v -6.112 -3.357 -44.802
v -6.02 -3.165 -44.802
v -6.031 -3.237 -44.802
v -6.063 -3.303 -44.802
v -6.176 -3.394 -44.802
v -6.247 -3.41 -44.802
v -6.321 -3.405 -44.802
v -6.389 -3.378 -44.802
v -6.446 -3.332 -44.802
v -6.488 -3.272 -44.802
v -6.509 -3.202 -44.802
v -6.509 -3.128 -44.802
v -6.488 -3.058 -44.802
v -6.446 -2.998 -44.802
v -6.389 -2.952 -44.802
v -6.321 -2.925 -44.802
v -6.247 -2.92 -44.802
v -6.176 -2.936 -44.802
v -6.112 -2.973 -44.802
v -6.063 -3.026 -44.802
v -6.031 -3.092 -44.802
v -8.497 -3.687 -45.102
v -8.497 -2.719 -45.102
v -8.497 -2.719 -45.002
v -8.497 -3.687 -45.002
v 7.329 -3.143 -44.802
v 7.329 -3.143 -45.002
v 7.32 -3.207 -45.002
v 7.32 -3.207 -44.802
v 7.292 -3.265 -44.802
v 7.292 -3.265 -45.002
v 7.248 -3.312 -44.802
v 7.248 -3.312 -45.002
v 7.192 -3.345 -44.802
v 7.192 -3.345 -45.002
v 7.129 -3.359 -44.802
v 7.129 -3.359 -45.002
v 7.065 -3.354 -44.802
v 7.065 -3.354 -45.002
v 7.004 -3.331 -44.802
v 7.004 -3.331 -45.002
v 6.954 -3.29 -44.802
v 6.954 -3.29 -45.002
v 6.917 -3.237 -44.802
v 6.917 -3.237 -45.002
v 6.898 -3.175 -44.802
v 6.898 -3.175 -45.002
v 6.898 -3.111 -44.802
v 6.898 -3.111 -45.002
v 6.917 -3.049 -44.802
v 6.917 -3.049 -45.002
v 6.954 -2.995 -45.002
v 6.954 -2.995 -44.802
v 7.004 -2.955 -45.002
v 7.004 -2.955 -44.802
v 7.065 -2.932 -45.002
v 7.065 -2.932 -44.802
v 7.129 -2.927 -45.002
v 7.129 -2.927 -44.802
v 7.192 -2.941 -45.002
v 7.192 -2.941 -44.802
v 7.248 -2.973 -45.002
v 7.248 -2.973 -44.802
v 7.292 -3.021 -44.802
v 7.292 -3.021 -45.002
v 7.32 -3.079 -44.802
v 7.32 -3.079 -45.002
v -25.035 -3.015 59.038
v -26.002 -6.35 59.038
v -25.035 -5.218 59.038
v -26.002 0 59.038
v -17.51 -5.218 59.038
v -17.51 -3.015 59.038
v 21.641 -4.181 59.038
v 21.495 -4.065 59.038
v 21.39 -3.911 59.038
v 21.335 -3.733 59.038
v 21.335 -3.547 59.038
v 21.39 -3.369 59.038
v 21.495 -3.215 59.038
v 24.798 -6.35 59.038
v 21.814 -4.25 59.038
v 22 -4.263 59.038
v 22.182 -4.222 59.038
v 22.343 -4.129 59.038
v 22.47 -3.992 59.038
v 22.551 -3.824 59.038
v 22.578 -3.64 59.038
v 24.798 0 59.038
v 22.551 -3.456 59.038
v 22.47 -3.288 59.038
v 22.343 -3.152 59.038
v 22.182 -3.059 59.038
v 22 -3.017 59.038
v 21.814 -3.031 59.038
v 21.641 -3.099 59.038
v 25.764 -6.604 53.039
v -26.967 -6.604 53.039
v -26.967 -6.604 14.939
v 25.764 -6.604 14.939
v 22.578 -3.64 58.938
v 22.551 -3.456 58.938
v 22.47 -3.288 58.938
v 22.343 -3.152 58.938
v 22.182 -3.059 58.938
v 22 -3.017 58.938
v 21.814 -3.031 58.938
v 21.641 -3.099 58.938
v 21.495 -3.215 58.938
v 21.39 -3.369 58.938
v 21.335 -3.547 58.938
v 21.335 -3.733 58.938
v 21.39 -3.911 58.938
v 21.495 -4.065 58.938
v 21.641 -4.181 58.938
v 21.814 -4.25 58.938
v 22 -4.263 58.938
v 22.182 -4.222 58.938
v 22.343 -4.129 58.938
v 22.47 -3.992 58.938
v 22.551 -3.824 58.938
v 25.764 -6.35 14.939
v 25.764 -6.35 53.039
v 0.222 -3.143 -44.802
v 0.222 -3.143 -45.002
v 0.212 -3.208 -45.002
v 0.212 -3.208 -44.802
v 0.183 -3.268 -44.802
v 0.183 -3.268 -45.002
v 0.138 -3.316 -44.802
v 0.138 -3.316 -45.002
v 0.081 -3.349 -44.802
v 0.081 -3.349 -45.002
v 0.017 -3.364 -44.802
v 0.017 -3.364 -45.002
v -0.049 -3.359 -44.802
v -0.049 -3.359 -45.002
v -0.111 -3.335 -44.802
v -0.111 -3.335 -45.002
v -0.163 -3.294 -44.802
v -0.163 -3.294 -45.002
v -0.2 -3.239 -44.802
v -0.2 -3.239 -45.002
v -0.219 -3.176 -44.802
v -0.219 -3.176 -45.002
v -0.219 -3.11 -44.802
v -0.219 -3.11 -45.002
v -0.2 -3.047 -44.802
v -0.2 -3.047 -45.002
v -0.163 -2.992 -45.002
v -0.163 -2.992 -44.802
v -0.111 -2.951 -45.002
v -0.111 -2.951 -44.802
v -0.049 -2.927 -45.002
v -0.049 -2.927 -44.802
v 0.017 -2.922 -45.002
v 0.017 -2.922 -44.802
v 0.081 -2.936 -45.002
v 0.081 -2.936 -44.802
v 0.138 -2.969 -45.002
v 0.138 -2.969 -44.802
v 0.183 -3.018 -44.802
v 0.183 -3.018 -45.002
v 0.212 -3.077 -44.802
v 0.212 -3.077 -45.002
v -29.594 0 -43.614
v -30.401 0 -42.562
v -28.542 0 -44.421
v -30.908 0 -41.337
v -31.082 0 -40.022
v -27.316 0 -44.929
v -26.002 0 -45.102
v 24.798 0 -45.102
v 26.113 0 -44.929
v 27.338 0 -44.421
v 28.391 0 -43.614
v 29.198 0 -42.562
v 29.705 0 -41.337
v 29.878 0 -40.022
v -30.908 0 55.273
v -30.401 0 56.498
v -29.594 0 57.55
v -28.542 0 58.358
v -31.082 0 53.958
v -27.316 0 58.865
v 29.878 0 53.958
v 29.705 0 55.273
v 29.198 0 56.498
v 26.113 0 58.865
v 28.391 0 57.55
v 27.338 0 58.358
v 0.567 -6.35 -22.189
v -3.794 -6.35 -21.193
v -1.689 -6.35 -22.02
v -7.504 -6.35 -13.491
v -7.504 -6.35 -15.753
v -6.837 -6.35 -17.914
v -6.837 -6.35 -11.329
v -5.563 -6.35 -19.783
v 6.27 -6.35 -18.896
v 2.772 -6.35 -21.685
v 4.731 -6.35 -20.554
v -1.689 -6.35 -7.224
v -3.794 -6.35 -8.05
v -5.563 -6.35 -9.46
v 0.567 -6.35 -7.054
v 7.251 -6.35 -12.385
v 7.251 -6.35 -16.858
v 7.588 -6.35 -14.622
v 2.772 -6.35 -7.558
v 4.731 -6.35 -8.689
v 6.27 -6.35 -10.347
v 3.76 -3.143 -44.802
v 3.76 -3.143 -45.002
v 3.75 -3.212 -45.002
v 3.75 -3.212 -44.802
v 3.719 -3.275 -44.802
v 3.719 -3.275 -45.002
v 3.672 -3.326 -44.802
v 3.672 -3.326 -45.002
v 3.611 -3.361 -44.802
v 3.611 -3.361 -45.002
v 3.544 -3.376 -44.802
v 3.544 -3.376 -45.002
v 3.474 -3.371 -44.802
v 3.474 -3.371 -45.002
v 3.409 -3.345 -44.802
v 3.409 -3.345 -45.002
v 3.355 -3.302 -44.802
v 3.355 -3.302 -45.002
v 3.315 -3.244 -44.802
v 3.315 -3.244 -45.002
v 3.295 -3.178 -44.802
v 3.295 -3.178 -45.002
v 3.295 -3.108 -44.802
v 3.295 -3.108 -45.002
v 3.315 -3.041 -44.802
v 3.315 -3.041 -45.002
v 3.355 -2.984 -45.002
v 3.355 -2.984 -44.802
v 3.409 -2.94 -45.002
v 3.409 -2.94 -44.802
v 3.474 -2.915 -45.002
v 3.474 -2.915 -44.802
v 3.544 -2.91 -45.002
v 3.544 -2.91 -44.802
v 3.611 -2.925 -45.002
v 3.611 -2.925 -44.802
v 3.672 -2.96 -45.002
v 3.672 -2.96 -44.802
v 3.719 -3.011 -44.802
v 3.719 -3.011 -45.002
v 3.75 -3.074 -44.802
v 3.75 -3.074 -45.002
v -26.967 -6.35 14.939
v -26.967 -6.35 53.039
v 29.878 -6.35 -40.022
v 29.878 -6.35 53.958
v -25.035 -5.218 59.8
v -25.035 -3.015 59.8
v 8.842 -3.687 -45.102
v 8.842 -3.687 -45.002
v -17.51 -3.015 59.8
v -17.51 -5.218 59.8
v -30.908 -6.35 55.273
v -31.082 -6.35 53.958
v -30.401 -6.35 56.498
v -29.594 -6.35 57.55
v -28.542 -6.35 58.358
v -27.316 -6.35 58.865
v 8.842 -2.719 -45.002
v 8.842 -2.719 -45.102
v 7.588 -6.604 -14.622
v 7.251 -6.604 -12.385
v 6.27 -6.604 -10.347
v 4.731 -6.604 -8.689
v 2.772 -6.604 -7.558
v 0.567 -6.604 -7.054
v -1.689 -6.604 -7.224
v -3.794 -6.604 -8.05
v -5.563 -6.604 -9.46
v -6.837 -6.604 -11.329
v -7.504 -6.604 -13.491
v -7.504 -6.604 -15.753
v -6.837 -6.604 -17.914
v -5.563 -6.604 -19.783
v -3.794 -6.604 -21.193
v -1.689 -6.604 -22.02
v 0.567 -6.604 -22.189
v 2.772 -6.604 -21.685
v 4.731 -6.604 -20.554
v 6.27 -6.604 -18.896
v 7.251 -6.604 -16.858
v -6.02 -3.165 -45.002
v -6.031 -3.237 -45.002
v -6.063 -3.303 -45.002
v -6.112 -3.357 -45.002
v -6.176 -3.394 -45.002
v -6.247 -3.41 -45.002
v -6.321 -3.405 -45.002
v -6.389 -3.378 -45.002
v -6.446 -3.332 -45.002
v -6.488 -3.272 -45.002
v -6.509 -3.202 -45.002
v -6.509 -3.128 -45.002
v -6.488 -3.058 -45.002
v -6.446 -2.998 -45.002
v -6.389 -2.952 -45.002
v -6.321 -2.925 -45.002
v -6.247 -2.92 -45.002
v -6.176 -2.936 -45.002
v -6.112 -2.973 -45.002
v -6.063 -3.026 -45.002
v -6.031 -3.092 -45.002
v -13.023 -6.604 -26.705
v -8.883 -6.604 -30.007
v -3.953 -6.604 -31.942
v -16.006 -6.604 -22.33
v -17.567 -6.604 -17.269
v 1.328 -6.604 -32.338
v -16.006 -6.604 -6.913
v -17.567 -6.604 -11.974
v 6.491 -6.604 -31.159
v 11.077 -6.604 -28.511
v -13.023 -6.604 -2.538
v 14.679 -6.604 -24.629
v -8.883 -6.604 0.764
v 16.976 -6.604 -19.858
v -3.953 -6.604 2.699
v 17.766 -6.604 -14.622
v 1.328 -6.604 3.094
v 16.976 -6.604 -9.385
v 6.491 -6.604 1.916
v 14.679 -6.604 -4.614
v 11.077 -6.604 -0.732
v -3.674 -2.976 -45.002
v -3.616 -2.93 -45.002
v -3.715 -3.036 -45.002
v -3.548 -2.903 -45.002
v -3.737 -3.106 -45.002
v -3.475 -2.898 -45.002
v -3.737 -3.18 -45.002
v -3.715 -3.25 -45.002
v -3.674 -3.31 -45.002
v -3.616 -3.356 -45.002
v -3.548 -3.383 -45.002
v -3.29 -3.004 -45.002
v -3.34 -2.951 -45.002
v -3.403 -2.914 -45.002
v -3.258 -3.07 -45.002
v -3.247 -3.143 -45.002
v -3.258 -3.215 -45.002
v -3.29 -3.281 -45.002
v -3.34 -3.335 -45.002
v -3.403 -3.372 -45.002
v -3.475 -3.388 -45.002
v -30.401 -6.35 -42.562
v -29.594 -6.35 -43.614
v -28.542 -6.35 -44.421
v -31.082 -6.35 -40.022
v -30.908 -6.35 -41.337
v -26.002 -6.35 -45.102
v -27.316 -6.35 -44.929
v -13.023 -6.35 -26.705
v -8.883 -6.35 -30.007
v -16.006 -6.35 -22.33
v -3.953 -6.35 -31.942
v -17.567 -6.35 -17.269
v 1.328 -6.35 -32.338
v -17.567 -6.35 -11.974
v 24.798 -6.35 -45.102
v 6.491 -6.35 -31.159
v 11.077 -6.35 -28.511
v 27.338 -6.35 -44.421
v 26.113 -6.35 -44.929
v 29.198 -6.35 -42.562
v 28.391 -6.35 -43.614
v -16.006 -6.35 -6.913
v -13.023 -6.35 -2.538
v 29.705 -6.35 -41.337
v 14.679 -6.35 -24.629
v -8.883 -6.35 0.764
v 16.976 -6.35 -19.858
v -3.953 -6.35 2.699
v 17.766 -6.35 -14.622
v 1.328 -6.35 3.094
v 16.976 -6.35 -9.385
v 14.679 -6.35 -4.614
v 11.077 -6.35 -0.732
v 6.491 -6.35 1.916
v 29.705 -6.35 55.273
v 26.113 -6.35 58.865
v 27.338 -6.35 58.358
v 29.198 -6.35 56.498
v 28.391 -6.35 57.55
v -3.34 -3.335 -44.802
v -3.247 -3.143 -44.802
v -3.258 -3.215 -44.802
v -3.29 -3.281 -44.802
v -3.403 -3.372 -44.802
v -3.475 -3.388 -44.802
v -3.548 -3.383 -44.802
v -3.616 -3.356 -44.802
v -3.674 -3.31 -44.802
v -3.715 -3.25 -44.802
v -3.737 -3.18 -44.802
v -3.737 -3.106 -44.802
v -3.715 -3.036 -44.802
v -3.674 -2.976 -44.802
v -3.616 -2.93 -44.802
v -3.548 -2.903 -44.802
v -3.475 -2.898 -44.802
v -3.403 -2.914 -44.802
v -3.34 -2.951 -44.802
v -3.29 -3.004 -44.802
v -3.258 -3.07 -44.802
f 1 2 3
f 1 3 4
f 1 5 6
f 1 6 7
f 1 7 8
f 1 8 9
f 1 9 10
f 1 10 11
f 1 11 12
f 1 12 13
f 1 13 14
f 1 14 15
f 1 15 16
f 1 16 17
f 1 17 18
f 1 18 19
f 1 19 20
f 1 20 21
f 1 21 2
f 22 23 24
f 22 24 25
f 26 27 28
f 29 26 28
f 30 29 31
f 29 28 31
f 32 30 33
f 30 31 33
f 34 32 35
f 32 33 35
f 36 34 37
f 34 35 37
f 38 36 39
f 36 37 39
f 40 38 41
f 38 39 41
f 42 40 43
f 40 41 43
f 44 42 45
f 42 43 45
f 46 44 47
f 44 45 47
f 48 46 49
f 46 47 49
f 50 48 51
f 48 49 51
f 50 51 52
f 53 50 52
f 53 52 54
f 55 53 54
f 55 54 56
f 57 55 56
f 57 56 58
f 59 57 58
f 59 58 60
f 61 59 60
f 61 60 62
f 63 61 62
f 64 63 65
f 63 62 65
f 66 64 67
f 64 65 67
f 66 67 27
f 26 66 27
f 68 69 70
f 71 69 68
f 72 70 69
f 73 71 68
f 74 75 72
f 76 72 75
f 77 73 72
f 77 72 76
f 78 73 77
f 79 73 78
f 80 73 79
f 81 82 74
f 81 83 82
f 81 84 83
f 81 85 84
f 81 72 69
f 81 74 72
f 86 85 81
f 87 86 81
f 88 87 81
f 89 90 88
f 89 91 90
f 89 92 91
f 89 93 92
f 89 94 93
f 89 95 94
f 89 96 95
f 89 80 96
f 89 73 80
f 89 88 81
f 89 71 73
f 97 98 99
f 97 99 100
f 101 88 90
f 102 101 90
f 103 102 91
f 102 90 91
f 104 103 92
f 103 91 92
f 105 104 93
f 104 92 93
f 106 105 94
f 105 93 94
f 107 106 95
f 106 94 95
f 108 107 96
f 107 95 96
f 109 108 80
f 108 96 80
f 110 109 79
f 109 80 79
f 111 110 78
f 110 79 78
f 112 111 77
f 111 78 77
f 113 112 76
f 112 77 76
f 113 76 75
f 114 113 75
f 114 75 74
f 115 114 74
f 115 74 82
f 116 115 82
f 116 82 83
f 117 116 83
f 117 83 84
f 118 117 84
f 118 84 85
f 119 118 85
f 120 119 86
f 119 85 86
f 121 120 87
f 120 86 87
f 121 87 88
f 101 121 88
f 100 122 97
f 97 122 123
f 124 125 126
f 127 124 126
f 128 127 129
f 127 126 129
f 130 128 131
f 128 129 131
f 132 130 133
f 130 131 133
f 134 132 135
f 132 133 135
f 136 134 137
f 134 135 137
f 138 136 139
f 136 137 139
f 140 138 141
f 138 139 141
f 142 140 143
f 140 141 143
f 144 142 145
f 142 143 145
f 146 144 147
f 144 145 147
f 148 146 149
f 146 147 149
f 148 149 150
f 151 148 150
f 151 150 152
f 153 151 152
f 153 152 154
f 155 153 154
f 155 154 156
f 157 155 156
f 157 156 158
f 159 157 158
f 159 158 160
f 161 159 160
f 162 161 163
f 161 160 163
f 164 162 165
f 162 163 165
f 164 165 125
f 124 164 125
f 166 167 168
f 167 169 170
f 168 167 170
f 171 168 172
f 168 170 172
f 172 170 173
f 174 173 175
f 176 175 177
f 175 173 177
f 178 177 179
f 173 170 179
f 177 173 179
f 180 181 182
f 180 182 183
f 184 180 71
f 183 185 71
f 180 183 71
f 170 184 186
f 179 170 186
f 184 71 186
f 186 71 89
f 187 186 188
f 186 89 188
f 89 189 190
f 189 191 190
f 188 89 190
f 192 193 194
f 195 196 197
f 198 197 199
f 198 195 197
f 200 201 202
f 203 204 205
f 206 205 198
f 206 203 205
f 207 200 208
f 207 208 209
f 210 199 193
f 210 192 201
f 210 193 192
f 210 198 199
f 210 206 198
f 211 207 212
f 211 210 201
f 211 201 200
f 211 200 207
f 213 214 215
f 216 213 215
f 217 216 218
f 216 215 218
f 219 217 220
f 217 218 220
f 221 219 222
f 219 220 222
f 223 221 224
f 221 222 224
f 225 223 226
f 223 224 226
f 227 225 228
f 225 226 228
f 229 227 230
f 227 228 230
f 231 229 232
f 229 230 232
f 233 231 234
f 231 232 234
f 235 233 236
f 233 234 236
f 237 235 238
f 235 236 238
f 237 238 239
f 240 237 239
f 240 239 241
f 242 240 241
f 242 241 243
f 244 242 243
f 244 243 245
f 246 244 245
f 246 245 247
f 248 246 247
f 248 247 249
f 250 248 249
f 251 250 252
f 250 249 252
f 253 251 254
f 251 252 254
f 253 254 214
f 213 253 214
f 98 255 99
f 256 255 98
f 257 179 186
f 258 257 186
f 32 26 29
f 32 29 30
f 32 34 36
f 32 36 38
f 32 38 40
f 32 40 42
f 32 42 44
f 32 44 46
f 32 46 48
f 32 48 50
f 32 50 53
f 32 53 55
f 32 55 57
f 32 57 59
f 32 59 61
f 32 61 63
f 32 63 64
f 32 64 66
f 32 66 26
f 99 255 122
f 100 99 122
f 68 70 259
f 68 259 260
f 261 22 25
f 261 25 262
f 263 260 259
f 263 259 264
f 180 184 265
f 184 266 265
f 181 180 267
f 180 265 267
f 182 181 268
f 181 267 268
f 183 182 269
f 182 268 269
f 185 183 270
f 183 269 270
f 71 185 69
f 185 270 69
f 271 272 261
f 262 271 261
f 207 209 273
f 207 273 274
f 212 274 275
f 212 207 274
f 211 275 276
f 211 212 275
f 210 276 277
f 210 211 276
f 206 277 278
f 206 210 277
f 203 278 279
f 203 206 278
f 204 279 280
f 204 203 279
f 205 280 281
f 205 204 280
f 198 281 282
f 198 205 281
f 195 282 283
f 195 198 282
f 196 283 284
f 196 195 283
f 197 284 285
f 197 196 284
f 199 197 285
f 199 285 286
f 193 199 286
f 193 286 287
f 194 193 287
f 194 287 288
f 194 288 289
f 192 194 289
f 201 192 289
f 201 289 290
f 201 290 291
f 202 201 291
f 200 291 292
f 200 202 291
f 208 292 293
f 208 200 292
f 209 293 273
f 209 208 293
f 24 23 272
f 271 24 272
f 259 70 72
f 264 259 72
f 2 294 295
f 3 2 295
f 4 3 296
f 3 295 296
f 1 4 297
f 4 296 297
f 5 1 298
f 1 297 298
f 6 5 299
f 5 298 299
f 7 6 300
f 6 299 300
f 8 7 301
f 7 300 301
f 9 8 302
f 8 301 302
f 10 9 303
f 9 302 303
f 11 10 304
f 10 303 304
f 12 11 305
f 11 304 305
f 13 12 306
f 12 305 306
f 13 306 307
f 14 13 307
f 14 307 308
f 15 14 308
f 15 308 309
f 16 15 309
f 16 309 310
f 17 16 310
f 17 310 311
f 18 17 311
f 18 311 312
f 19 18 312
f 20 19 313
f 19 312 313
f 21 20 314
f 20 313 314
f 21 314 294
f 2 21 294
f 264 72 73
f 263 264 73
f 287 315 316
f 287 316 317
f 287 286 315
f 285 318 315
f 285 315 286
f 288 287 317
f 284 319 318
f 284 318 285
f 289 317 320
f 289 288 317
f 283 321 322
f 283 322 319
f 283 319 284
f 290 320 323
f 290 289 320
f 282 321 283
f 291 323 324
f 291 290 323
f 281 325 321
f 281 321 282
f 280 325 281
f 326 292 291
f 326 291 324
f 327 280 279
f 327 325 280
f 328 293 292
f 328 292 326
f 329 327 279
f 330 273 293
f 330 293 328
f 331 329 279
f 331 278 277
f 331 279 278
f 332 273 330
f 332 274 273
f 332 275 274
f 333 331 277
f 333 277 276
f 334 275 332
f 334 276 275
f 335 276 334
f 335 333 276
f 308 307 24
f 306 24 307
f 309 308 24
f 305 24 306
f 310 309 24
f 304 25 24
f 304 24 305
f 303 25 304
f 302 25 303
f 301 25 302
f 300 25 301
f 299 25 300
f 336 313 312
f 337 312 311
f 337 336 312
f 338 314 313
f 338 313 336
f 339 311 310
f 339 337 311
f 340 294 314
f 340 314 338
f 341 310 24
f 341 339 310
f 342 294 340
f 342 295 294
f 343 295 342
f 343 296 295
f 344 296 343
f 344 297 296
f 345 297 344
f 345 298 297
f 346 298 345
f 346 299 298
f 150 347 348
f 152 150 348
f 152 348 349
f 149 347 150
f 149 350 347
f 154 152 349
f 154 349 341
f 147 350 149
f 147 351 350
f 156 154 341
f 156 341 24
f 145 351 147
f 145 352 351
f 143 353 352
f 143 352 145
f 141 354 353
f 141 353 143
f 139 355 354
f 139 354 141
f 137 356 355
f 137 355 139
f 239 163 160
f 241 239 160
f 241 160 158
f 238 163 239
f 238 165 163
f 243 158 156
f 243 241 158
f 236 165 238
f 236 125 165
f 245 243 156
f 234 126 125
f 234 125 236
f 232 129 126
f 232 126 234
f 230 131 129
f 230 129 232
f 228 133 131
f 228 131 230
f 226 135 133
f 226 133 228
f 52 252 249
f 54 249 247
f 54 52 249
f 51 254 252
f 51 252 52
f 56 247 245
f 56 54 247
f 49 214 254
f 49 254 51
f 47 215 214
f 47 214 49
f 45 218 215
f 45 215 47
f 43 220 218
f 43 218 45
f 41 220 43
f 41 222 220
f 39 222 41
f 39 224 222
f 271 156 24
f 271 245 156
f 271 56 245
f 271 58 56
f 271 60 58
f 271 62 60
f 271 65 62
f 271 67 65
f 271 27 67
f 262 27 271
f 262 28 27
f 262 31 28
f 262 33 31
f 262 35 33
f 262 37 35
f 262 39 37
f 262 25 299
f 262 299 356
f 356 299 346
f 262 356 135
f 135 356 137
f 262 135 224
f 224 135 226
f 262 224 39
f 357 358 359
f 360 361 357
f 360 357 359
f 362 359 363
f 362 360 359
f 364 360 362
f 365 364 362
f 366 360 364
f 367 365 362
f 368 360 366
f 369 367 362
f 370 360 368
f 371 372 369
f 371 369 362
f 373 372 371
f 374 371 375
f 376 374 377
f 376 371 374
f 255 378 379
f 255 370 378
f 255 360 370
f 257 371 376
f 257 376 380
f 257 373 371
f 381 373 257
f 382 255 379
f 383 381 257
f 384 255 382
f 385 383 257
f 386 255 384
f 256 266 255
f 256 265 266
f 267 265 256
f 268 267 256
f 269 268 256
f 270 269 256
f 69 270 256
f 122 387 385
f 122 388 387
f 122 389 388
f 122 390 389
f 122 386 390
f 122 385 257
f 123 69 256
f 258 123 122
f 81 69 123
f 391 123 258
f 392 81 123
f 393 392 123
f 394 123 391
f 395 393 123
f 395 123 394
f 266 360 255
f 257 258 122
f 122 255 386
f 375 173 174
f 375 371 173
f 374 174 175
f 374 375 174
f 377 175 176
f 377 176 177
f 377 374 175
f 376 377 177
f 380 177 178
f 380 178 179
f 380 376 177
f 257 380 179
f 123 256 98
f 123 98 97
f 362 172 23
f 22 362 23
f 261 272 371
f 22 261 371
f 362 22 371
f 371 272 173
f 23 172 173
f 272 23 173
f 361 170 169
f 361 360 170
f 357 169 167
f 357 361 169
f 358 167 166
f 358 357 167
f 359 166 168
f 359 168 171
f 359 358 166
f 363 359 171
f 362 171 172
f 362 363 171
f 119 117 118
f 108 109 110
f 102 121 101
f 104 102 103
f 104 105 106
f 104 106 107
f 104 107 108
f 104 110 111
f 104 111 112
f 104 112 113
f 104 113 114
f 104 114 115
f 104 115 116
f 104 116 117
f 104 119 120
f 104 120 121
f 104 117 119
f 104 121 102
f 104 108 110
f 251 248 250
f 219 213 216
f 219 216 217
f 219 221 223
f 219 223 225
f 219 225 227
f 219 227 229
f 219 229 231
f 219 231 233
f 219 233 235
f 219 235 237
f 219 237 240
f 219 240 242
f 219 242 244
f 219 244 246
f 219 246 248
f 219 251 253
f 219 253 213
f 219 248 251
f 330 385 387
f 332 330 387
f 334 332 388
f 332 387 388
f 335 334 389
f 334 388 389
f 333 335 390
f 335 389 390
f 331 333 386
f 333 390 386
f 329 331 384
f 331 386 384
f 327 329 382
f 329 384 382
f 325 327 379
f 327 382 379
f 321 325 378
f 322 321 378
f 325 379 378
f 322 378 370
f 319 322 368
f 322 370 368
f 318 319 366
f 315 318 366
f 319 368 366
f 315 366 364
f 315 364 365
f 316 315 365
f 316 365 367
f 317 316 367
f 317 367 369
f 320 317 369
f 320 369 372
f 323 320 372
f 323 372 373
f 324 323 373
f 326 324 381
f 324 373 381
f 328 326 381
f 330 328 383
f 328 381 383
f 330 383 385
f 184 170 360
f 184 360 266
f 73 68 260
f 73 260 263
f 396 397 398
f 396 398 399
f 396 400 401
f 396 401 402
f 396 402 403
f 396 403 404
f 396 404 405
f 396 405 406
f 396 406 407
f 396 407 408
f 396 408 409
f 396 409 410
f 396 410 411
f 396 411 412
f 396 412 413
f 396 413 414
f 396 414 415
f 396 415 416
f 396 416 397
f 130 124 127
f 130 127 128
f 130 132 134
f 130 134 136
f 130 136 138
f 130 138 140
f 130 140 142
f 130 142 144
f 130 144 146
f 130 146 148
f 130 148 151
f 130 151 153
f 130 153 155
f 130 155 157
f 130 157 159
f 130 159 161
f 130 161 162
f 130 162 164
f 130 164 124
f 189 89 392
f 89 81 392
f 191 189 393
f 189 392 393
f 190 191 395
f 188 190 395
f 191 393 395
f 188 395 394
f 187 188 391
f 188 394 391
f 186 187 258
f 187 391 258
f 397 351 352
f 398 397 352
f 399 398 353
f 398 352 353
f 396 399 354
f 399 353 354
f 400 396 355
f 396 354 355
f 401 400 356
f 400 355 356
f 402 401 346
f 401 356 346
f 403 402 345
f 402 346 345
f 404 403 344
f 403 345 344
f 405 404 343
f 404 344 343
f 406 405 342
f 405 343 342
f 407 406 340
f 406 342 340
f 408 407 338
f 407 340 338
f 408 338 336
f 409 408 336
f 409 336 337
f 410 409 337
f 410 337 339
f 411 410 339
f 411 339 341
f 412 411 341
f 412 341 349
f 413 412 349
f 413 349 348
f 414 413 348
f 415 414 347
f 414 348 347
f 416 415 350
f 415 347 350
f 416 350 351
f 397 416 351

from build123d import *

# Parameters (mm, degrees)
F0_W      = 60.96
F0_H      = 104.14
F0_R      = 17.78
F0_R_2    = 7.62
F1_DEPTH  = 6.35
F2_R      = 17.7657824196
F2_R_2    = 7.588336925
F3_DEPTH  = 0.254
F4_W      = 52.7304011778
F4_H      = 38.1
F5_DEPTH  = 0.254
F6_W      = 7.5248517096
F6_H      = 2.2023727652
F7_DEPTH  = 0.762
F8_R      = 5.08
F9_R      = 0.6248874124
F10_DEPTH = 0.1
F11_W     = 17.3393432051
F11_H     = 0.9681868833
F12_DEPTH = 0.1
F13_R     = 0.2460151655
F13_R_2   = 0.2460152488
F13_R_3   = 0.2218778153
F13_R_4   = 0.2339087287
F13_R_5   = 0.2167167574
F14_DEPTH = 0.2


with BuildPart() as f1:
    # F0 (on Front) → F1 (new body)
    with BuildSketch(Plane.XZ):
        with Locations((-0.6015785038, 6.9682898942)):
            Rectangle(F0_W, F0_H)
        with Locations((0, -14.6217101058)):
            Circle(F0_R, mode=Mode.SUBTRACT)
        Polygon((-26.619868353, 33.6382898942), (-26.619868353, 52.6882898942), (25.7174987346, 52.6882898942), (25.7174987346, 14.5882898942), (-26.619868353, 14.5882898942), align=None, mode=Mode.SUBTRACT)
        Polygon((25.7174987346, 52.6882898942), (-26.619868353, 52.6882898942), (-26.619868353, 33.6382898942), (-26.619868353, 14.5882898942), (25.7174987346, 14.5882898942), align=None)
        with Locations((0, -14.6217101058)):
            Circle(F0_R)
        with Locations((0, -14.6217101058)):
            Circle(F0_R_2, mode=Mode.SUBTRACT)
        with Locations((0, -14.6217101058)):
            Circle(F0_R_2)
    extrude(amount=F1_DEPTH)

    # F2 (on face) → F3 (join)
    with BuildSketch(Plane.XZ.offset(6.35)):
        with Locations((0, -14.6216154099)):
            Circle(F2_R)
        with Locations((0, -14.6216154099)):
            Circle(F2_R_2, mode=Mode.SUBTRACT)
    extrude(amount=F3_DEPTH)

    # F4 (on face) → F5 (join)
    with BuildSketch(Plane.XZ.offset(6.35)):
        with Locations((-0.6015794352, 33.9892106131)):
            Rectangle(F4_W, F4_H)
    extrude(amount=F5_DEPTH)

    # F6 (on face) → F7 (join)
    with BuildSketch(Plane.XY.offset(59.0382898942)):
        with Locations((-21.2724506855, -4.1166004958)):
            Rectangle(F6_W, F6_H)
    extrude(amount=F7_DEPTH)

    # F8
    f8_edges = [f1.edges().sort_by_distance(p)[0] for p in [
        (29.878421, -3.175, 59.03829),
        (-31.081579, -3.175, 59.03829),
        (-31.081579, -3.175, -45.10171),
        (29.878421, -3.175, -45.10171),
    ]]
    fillet(f8_edges, radius=F8_R)

    # F9 (on face) → F10 (cut)
    with BuildSketch(Plane.XY.offset(59.0382898942)):
        with Locations((21.9533834606, -3.6403015256)):
            Circle(F9_R)
    extrude(amount=-F10_DEPTH, mode=Mode.SUBTRACT)

    # F11 (on face) → F12 (cut)
    with BuildSketch(Plane(origin=(0, 0, -45.1017101058), x_dir=(1, 0, 0), z_dir=(0, 0, -1))):
        with Locations((0.1725424081, 3.2033285825)):
            Rectangle(F11_W, F11_H)
    extrude(amount=-F12_DEPTH, mode=Mode.SUBTRACT)

    # F13 (on face) → F14 (cut)
    with BuildSketch(Plane(origin=(0, 0, -45.0017101058), x_dir=(1, 0, 0), z_dir=(0, 0, -1))):
        with Locations((-6.265850272, 3.1648736913)):
            Circle(F13_R)
        with Locations((-3.4933153074, 3.1428695656)):
            Circle(F13_R_2)
        with Locations((0, 3.1428695656)):
            Circle(F13_R_3)
        with Locations((3.5260387231, 3.1428695656)):
            Circle(F13_R_4)
        with Locations((7.1127302945, 3.1428695656)):
            Circle(F13_R_5)
    extrude(amount=-F14_DEPTH, mode=Mode.SUBTRACT)


solid = f1.part
